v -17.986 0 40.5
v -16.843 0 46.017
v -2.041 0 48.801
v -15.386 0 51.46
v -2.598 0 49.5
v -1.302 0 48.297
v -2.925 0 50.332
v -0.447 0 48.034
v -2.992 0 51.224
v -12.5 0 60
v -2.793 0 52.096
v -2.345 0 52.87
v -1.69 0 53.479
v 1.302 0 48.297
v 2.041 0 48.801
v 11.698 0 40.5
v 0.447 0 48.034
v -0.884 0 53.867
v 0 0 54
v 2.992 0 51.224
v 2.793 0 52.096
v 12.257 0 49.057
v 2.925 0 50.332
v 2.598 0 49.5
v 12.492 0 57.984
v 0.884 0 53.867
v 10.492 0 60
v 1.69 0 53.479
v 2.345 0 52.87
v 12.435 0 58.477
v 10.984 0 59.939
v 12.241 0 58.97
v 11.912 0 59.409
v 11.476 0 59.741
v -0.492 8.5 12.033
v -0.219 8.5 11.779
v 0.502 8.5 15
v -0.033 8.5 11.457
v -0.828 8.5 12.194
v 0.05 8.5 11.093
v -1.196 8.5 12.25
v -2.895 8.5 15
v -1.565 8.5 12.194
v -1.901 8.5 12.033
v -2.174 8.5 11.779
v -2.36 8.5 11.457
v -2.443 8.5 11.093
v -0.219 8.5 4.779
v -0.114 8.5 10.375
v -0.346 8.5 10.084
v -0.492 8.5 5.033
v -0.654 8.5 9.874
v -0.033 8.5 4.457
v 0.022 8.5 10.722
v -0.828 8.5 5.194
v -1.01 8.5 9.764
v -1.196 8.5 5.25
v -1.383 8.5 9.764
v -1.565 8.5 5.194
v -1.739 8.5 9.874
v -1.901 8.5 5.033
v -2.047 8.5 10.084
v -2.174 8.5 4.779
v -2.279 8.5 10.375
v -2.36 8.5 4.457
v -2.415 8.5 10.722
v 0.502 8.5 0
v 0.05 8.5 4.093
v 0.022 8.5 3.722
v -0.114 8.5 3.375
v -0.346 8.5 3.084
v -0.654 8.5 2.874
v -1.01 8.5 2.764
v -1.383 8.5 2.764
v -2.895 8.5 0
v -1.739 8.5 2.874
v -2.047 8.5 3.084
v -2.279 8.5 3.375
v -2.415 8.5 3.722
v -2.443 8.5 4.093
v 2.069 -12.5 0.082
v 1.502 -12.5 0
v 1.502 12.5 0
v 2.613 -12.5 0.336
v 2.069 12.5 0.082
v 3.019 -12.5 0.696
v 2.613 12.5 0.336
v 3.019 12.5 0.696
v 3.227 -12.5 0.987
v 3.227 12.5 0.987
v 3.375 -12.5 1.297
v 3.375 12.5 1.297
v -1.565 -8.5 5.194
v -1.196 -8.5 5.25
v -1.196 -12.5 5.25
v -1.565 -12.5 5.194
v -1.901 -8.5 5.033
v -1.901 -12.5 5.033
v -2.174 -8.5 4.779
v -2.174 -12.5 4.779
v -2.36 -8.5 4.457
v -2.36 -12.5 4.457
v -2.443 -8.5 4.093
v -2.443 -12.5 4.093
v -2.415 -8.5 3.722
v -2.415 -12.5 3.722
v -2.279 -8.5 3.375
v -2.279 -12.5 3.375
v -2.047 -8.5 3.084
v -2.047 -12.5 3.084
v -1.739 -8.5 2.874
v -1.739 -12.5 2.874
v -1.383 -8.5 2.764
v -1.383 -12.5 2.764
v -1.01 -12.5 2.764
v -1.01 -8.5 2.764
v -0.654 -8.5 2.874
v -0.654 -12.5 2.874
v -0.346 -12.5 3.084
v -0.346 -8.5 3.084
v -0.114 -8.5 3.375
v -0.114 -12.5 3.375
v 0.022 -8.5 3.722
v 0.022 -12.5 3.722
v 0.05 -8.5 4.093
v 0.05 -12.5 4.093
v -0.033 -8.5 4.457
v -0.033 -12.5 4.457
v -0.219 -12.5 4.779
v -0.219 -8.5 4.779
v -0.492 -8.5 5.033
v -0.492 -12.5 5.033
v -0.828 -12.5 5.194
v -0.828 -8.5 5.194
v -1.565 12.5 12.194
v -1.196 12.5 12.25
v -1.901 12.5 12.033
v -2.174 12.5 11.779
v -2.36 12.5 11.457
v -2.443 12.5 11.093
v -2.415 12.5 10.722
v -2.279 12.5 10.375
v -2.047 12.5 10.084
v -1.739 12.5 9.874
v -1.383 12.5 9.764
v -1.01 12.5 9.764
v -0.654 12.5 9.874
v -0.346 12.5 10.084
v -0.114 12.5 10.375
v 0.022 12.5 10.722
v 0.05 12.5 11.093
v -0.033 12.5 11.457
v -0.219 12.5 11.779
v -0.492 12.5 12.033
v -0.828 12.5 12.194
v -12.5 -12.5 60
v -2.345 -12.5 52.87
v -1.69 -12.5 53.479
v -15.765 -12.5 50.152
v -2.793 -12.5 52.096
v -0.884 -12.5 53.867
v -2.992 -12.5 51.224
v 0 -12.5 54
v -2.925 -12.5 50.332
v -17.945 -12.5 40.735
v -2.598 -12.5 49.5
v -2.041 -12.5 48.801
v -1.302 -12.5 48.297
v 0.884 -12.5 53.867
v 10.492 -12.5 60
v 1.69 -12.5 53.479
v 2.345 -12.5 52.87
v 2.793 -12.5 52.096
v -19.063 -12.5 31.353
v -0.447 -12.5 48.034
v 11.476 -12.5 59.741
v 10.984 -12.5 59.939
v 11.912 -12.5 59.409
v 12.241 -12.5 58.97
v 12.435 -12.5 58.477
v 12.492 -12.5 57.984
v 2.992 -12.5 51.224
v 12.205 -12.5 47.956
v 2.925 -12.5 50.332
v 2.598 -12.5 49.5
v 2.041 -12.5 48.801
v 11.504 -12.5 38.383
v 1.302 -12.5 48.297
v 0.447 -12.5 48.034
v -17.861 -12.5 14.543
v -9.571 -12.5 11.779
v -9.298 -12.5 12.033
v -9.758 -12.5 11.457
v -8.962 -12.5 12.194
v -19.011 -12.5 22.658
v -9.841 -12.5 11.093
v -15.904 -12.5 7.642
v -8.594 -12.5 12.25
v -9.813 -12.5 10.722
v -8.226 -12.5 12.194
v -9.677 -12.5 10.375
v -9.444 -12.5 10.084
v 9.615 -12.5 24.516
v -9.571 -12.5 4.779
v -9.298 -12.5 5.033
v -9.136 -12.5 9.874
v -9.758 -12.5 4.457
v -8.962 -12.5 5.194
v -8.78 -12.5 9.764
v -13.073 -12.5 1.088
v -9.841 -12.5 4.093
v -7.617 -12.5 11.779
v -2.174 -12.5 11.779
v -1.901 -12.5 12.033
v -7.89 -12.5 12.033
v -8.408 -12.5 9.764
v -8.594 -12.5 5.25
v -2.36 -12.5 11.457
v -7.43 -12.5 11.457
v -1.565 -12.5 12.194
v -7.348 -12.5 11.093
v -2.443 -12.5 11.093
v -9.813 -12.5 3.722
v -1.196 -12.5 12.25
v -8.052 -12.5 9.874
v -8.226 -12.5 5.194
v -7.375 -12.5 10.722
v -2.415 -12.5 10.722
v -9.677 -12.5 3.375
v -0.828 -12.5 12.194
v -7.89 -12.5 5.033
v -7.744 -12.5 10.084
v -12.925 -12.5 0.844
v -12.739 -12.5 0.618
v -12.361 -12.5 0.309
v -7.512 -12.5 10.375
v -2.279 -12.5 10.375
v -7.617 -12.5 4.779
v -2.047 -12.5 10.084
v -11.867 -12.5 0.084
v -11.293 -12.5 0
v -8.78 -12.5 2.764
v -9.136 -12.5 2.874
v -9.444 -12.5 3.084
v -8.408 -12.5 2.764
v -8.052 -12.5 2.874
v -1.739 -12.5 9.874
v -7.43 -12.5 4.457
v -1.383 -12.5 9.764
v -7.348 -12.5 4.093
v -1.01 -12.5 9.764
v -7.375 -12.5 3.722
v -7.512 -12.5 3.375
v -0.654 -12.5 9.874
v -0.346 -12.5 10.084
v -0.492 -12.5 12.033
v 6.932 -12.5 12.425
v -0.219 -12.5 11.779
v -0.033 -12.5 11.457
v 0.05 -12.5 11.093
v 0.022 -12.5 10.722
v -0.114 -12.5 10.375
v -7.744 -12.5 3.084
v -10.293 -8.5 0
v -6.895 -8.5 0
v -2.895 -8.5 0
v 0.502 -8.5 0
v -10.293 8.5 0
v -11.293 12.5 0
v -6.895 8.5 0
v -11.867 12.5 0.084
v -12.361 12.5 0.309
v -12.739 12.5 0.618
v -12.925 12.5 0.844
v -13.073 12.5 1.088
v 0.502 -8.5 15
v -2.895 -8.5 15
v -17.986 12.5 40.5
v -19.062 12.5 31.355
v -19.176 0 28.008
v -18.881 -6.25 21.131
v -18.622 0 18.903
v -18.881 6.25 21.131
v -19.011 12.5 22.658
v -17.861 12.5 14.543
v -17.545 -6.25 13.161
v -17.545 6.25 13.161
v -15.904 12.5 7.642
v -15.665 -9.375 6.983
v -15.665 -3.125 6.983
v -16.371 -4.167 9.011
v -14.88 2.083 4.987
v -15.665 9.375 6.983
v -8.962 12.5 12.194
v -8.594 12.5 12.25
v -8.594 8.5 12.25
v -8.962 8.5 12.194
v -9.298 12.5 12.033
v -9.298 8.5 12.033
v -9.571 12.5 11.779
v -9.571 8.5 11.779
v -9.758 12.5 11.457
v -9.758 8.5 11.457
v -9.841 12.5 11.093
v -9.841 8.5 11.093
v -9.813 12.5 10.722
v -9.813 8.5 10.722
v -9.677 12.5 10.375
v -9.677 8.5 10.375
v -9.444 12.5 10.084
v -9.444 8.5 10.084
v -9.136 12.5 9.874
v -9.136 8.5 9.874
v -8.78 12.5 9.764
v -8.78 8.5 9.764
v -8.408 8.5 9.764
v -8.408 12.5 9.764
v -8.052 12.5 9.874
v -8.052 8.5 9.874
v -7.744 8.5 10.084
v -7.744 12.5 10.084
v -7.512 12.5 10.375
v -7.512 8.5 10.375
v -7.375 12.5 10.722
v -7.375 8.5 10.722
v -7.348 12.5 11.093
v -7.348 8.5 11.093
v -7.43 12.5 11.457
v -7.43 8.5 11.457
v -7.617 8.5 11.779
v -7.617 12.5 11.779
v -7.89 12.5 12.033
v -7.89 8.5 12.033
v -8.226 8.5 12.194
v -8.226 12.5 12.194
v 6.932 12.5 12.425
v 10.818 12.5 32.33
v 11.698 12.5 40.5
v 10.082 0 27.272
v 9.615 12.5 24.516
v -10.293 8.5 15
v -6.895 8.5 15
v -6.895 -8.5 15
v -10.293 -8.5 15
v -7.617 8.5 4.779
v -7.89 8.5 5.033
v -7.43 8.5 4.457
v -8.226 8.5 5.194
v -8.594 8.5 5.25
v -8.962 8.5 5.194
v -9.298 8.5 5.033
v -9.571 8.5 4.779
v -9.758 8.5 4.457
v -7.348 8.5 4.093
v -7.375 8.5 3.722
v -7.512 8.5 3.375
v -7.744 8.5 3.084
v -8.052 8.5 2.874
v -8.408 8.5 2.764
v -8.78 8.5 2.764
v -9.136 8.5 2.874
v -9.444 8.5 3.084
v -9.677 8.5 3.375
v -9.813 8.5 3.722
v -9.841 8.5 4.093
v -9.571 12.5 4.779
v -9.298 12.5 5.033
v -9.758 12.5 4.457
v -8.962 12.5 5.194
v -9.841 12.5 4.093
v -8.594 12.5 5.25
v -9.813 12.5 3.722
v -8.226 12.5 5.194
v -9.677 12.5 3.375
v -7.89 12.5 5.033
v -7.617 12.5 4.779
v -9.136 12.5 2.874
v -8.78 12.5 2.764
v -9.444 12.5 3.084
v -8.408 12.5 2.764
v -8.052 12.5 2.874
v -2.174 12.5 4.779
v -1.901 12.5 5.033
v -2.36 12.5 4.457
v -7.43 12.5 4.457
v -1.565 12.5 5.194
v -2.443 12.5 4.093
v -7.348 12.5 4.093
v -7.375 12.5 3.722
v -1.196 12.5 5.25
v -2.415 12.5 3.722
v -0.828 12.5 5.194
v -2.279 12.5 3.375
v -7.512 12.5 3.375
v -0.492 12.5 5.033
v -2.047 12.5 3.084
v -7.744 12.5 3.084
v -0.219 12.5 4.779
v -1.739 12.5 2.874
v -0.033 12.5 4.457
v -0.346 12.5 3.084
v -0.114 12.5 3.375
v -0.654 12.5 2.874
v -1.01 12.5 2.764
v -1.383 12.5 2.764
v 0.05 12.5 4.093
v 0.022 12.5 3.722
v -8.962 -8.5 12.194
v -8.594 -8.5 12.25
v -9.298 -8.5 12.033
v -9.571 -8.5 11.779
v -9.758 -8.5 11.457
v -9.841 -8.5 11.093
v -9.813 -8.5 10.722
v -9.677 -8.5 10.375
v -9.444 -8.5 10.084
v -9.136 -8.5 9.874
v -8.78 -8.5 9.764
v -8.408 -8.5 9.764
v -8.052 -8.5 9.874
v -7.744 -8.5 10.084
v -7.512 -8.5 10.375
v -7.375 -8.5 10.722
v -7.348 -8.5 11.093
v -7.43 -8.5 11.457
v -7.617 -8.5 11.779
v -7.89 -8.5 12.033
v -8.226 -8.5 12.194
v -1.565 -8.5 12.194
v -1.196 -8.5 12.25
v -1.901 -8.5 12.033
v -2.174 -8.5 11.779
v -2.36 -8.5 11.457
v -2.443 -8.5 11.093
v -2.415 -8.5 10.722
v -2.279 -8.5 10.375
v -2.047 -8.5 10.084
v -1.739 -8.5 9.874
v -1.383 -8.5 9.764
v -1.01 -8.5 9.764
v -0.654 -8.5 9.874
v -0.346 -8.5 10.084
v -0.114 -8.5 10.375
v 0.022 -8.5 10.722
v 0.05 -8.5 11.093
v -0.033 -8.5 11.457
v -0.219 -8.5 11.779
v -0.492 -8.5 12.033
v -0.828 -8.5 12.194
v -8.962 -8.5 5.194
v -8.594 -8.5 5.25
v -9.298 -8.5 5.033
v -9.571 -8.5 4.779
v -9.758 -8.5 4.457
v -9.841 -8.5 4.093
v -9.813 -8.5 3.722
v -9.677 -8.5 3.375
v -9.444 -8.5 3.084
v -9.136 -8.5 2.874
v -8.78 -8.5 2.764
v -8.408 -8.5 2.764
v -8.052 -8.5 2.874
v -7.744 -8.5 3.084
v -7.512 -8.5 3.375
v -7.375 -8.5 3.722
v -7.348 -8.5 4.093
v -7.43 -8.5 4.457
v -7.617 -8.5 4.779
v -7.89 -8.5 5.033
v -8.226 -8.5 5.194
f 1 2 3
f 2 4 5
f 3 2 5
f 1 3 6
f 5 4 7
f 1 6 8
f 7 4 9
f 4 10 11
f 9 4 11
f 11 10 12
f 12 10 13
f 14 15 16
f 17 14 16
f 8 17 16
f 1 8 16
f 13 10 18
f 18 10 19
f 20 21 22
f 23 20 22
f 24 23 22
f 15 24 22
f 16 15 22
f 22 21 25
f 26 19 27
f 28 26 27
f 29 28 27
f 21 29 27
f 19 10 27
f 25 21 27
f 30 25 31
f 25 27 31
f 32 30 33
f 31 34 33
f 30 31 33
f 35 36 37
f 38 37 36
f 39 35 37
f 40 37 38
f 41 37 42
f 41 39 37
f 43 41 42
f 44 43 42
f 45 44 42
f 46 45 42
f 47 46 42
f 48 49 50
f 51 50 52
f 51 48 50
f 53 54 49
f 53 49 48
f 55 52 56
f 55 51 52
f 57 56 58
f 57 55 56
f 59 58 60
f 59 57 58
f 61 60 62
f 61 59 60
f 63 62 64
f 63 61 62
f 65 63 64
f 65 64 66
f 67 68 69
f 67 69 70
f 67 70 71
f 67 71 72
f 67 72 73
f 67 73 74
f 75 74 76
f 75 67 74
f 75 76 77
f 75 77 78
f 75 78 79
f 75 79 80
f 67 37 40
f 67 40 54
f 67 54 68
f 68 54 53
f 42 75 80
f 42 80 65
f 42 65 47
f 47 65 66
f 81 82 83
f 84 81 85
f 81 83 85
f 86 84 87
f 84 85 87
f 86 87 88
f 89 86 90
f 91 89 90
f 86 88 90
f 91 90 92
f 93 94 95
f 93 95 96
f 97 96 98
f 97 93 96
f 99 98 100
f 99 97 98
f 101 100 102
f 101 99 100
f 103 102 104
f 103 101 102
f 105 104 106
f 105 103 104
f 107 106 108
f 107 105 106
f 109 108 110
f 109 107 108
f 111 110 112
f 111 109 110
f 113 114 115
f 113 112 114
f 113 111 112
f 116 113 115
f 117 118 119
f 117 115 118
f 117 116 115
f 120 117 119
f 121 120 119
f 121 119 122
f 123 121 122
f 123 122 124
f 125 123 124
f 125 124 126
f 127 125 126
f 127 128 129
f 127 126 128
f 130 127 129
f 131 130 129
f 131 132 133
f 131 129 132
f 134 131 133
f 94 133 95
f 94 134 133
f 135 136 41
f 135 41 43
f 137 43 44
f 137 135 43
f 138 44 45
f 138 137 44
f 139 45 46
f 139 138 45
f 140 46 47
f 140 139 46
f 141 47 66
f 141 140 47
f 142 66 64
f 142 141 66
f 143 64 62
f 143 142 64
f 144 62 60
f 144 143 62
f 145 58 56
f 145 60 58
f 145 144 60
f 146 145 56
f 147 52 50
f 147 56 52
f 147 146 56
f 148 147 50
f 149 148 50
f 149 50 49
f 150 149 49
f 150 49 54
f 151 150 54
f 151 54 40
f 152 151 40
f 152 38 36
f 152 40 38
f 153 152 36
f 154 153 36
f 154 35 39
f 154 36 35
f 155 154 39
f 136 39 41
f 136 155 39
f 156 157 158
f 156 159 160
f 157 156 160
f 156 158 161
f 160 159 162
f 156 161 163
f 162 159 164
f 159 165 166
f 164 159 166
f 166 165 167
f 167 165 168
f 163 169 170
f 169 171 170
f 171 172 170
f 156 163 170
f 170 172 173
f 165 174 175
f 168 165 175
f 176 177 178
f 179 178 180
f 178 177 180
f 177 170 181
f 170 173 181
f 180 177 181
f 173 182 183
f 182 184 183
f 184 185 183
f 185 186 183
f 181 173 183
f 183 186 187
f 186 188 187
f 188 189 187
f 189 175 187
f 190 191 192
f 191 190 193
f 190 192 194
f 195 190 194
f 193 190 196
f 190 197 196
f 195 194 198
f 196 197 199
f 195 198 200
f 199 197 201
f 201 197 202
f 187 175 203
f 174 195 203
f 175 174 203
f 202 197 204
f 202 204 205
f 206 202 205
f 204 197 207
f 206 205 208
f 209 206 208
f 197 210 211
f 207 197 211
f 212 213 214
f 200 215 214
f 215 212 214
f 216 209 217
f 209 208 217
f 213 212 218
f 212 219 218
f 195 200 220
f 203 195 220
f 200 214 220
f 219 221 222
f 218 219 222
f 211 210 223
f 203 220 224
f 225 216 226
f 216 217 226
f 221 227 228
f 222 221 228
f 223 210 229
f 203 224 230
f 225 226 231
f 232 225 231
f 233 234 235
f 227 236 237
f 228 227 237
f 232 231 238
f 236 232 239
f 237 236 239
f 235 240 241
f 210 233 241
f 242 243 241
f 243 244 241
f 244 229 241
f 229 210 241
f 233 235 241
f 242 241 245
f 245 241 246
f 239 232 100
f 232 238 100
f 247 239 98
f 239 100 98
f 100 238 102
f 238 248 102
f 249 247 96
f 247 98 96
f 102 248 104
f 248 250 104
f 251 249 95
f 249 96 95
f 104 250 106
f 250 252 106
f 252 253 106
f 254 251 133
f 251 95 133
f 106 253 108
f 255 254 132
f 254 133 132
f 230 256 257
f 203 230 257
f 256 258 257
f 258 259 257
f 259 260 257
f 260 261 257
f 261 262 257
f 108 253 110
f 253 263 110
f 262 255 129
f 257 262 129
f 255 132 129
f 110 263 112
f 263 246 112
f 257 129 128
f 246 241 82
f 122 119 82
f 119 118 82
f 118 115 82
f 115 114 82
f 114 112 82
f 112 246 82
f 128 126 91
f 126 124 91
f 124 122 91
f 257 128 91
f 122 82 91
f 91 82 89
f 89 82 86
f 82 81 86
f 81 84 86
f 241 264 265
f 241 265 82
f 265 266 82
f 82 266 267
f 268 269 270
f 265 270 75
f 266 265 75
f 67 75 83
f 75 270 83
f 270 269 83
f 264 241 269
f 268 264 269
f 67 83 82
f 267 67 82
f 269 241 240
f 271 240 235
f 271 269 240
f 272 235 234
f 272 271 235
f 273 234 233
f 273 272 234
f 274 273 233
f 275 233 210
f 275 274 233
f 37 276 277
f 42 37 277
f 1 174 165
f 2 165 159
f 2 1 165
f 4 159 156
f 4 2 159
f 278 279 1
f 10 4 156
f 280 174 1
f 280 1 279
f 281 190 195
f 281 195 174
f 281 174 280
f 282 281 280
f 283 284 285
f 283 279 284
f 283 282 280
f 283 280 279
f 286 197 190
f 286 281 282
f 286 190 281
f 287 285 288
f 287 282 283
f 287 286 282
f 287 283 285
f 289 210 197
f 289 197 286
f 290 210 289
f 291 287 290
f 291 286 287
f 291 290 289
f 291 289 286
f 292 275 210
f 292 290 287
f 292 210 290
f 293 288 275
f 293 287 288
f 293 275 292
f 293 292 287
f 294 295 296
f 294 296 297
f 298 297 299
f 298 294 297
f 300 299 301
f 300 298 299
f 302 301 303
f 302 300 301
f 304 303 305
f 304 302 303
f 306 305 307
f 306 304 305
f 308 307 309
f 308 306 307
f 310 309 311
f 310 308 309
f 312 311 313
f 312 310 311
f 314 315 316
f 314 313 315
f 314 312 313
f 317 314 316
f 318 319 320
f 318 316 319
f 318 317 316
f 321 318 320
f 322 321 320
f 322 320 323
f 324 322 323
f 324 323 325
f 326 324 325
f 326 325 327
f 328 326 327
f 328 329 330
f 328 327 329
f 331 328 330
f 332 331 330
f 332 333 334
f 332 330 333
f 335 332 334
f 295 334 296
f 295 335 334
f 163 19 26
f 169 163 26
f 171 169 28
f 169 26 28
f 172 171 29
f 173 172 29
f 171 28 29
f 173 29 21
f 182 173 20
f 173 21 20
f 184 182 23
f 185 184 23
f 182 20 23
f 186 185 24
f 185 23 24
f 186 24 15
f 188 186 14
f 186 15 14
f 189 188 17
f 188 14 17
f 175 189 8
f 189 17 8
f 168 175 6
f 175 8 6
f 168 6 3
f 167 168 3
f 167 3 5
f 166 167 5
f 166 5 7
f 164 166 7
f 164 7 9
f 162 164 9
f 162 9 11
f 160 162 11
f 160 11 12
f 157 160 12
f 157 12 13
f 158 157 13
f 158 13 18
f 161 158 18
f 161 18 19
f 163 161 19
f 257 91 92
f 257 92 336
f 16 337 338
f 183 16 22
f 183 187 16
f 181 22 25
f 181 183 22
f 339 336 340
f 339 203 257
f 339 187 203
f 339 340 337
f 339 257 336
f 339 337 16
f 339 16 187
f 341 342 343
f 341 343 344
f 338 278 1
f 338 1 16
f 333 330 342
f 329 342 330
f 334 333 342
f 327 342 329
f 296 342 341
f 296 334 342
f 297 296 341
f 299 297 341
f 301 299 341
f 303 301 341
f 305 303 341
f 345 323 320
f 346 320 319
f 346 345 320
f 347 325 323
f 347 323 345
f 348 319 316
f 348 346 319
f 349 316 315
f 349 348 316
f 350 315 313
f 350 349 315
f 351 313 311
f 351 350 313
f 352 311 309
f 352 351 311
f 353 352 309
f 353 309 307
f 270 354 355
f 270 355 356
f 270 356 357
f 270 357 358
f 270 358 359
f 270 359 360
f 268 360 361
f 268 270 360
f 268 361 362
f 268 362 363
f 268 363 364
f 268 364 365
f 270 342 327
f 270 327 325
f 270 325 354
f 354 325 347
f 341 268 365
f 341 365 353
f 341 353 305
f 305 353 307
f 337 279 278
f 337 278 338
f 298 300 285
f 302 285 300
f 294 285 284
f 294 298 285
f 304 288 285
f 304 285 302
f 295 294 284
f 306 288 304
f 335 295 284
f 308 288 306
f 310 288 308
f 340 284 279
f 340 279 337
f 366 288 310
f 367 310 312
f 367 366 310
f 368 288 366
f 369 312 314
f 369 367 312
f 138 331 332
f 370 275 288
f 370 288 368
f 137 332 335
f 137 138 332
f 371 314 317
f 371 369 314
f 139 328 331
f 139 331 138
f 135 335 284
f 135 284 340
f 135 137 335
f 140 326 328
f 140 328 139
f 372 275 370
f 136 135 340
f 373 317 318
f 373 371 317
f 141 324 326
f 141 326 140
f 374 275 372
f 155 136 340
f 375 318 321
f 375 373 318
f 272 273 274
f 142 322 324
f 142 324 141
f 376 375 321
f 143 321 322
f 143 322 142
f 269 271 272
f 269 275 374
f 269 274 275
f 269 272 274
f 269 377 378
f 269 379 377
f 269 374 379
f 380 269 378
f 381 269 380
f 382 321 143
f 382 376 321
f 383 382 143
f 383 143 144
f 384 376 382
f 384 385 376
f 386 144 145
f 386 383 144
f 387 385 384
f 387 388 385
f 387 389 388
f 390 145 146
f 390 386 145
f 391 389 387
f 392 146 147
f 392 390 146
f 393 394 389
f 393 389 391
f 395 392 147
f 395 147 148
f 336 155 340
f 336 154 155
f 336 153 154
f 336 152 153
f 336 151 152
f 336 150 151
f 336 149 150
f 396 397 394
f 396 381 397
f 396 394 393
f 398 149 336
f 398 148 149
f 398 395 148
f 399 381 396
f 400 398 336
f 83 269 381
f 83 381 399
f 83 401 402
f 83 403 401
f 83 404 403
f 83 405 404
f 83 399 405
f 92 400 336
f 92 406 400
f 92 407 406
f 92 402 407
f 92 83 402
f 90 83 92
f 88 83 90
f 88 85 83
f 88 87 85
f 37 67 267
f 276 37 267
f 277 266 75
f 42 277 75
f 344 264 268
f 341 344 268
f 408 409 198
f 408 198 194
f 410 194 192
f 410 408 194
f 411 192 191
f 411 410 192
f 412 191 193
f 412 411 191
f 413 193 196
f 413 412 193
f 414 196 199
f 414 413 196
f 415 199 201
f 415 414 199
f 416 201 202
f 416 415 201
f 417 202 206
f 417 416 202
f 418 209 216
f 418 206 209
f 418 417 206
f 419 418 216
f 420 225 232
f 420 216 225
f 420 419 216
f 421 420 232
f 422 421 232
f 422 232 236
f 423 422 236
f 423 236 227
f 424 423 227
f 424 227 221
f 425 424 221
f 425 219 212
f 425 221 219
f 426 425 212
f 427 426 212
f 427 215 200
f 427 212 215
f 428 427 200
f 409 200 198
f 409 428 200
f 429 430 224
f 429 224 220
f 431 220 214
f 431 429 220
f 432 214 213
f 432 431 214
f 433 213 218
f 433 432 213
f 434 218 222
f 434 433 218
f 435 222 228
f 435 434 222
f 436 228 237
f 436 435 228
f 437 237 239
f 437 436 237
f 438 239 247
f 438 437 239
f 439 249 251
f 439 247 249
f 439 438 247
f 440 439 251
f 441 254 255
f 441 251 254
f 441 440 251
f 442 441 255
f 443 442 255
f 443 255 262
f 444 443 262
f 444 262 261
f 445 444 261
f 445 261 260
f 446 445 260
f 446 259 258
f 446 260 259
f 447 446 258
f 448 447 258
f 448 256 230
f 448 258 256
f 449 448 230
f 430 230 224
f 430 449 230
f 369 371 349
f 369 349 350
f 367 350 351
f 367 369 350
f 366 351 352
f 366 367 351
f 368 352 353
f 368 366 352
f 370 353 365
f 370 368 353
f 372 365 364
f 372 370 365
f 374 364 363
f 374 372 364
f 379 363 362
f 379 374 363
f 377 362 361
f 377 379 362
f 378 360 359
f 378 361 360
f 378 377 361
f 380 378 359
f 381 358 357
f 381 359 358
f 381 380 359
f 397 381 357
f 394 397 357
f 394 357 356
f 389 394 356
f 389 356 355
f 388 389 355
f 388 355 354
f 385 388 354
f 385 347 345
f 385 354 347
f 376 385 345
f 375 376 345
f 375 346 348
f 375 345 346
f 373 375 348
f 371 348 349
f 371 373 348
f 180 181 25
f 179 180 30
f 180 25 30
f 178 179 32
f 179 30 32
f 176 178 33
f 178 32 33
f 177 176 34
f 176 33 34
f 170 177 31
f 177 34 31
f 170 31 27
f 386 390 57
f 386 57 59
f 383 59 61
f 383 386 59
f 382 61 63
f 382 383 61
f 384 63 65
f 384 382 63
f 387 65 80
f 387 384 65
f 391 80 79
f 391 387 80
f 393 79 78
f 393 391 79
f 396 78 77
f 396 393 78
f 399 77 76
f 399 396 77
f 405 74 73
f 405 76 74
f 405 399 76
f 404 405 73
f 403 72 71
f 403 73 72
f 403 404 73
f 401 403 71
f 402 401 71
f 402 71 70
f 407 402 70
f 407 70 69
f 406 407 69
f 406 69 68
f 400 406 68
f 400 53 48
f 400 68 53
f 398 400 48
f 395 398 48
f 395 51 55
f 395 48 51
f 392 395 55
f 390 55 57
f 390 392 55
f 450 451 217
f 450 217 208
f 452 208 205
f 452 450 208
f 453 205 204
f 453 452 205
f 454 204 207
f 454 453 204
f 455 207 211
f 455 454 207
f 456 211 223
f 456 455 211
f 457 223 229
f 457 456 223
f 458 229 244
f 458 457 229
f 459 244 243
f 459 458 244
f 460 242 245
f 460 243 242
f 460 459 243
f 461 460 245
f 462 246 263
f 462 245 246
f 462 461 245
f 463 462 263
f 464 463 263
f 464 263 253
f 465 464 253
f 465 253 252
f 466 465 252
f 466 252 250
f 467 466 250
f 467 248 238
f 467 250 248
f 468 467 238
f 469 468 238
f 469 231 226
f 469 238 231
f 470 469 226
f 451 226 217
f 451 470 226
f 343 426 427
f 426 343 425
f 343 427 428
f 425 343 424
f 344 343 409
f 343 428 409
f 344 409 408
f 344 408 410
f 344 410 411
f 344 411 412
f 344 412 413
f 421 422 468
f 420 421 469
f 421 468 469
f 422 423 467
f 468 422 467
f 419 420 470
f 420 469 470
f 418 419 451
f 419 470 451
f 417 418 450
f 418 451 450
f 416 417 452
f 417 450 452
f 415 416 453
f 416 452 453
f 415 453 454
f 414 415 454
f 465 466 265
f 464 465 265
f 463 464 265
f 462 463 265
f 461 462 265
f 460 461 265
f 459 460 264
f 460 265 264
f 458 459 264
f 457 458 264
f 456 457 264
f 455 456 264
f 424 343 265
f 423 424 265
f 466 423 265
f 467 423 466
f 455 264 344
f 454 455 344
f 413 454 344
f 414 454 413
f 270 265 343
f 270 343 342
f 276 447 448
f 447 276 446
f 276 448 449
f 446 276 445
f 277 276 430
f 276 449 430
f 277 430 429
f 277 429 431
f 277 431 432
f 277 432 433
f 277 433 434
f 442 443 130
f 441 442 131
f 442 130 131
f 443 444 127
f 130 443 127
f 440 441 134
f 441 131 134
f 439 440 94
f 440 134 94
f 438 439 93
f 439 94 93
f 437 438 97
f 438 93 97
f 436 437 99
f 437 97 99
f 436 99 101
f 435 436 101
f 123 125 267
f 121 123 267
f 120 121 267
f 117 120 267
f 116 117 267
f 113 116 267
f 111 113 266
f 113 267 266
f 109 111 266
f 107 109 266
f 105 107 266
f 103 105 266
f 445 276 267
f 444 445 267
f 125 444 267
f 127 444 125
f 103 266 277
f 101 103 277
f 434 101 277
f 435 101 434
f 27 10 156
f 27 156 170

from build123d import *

# Parameters (mm, degrees)
SKETCH_1_W               = 25
SKETCH_1_H               = 25
EXTRUDE_1_DEPTH          = 60
EXTRUDE_4_DEPTH          = 25
CUT_EXTRUDE_START        = -25
CUT_EXTRUDE_4_DEPTH      = 25
SKETCH_4_W               = 41.211163986
SKETCH_4_H               = 12.5
CUT_EXTRUDE_2_DEPTH      = 19.5
SKETCH_2_R               = 3
CUT_EXTRUDE_1_DEPTH      = 36.406845426
FILLET_1_R               = 2
SKETCH_6_W               = 3.397693812
SKETCH_6_H               = 8.5
SKETCH_6_H_2             = 17
CUT_EXTRUDE_5_DEPTH      = 15
CUT_EXTRUDE_6_DEPTH      = 31
CUT_EXTRUDE_6_DEPTH_BACK = 10
SKETCH_7_R               = 1.25
FILLET_2_R               = 2


# Read off the part's stored shape, not the designer's step: 컷-돌출4
with BuildPart() as part:
    # 스케치1 → 보스-돌출1 (new body)
    with BuildSketch(Plane.XY):
        Rectangle(SKETCH_1_W, SKETCH_1_H)
    extrude(amount=EXTRUDE_1_DEPTH)

    # 스케치5 → 보스-돌출4 (add)
    with BuildSketch(Plane(origin=(0, 12.5, 0), x_dir=(1, 0, 0), z_dir=(0, 1, 0))):
        with BuildLine():
            add(Edge.make_bspline(
                [(2.878979614, 0), (12.5, -24.697131942), (12.5, -60)],
                knots=[0, 0, 0, 1, 1, 1], degree=2))
            Line((2.878979614, 0), (-12.5, 0))
            Line((-12.5, 0), (-12.5, -60))
            Line((-12.5, -60), (12.5, -60))
        make_face()
        with BuildLine():
            Line((-12.5, -60), (-12.5, 0))
            add(Edge.make_bspline(
                [(-12.5, 0), (-25.857752506, -24.697131942), (-12.5, -60)],
                knots=[0, 0, 0, 1, 1, 1], degree=2))
        make_face()
    extrude(amount=-EXTRUDE_4_DEPTH)

    # 컷-돌출4 outline → 컷-돌출4 (cut)
    with BuildSketch(Plane(origin=(0, 12.5, 0), x_dir=(1, 0, 0), z_dir=(0, 1, 0)).offset(CUT_EXTRUDE_START)):
        with BuildLine():
            Line((12.5, 0), (2.878979614, 0))
            add(Edge.make_bspline(
                [(2.878979614, 0), (12.5, -24.697131942), (12.5, -60)],
                knots=[0, 0, 0, 1, 1, 1], degree=2))
            Line((12.5, -60), (12.5, 0))
        make_face()
    extrude(amount=CUT_EXTRUDE_4_DEPTH, mode=Mode.SUBTRACT)

    # 스케치4 → 컷-돌출2 (cut)
    with BuildSketch(Plane.XY.offset(60)):
        with Locations((-1.817465194, 6.25)):
            Rectangle(SKETCH_4_W, SKETCH_4_H)
    extrude(amount=-CUT_EXTRUDE_2_DEPTH, mode=Mode.SUBTRACT)

    # 스케치2 → 컷-돌출1 (cut)
    with BuildSketch(Plane(origin=(0, 12.5, 0), x_dir=(1, 0, 0), z_dir=(0, 1, 0))):
        with Locations(Location((0, -51, 0), (0, 0, 270))):
            Circle(SKETCH_2_R)
    extrude(amount=-CUT_EXTRUDE_1_DEPTH, mode=Mode.SUBTRACT)

    # 필렛1
    fillet_1_edges = [part.edges().sort_by_distance(p)[0] for p in [
        (2.878979614, 0, 0),
        (-12.5, 0, 0),
    ]]
    fillet(fillet_1_edges, radius=FILLET_1_R)

    # 스케치6 → 컷-돌출5 (cut)
    with BuildSketch(Plane(origin=(0, 0, 0), x_dir=(-1, 0, 0), z_dir=(0, 0, -1))):
        with Locations((1.196360316, 4.25)):
            Rectangle(SKETCH_6_W, SKETCH_6_H)
        with Locations((1.196360316, -4.25)):
            Rectangle(SKETCH_6_W, SKETCH_6_H)
        with Locations((8.594054128, 0)):
            Rectangle(SKETCH_6_W, SKETCH_6_H_2)
    extrude(amount=-CUT_EXTRUDE_5_DEPTH, mode=Mode.SUBTRACT)

    # 스케치7 → 컷-돌출6 (cut, two sides: drawn at the far end of the back side and taken through both)
    with BuildSketch(Plane.XZ.offset(-8.5).offset(-CUT_EXTRUDE_6_DEPTH_BACK)):
        with Locations(Location((-1.196360316, 4, 0), (0, 0, 90))):
            Circle(SKETCH_7_R)
        with Locations(Location((-1.196360316, 11, 0), (0, 0, 90))):
            Circle(SKETCH_7_R)
        with Locations(Location((-8.594054128, 4, 0), (0, 0, 90))):
            Circle(SKETCH_7_R)
        with Locations(Location((-8.594054128, 11, 0), (0, 0, 90))):
            Circle(SKETCH_7_R)
    extrude(amount=CUT_EXTRUDE_6_DEPTH + CUT_EXTRUDE_6_DEPTH_BACK, mode=Mode.SUBTRACT)

    # 필렛2
    fillet_2_edges = [part.edges().sort_by_distance(p)[0] for p in [
        (12.5, -6.25, 60),
    ]]
    fillet(fillet_2_edges, radius=FILLET_2_R)


solid = part.part
